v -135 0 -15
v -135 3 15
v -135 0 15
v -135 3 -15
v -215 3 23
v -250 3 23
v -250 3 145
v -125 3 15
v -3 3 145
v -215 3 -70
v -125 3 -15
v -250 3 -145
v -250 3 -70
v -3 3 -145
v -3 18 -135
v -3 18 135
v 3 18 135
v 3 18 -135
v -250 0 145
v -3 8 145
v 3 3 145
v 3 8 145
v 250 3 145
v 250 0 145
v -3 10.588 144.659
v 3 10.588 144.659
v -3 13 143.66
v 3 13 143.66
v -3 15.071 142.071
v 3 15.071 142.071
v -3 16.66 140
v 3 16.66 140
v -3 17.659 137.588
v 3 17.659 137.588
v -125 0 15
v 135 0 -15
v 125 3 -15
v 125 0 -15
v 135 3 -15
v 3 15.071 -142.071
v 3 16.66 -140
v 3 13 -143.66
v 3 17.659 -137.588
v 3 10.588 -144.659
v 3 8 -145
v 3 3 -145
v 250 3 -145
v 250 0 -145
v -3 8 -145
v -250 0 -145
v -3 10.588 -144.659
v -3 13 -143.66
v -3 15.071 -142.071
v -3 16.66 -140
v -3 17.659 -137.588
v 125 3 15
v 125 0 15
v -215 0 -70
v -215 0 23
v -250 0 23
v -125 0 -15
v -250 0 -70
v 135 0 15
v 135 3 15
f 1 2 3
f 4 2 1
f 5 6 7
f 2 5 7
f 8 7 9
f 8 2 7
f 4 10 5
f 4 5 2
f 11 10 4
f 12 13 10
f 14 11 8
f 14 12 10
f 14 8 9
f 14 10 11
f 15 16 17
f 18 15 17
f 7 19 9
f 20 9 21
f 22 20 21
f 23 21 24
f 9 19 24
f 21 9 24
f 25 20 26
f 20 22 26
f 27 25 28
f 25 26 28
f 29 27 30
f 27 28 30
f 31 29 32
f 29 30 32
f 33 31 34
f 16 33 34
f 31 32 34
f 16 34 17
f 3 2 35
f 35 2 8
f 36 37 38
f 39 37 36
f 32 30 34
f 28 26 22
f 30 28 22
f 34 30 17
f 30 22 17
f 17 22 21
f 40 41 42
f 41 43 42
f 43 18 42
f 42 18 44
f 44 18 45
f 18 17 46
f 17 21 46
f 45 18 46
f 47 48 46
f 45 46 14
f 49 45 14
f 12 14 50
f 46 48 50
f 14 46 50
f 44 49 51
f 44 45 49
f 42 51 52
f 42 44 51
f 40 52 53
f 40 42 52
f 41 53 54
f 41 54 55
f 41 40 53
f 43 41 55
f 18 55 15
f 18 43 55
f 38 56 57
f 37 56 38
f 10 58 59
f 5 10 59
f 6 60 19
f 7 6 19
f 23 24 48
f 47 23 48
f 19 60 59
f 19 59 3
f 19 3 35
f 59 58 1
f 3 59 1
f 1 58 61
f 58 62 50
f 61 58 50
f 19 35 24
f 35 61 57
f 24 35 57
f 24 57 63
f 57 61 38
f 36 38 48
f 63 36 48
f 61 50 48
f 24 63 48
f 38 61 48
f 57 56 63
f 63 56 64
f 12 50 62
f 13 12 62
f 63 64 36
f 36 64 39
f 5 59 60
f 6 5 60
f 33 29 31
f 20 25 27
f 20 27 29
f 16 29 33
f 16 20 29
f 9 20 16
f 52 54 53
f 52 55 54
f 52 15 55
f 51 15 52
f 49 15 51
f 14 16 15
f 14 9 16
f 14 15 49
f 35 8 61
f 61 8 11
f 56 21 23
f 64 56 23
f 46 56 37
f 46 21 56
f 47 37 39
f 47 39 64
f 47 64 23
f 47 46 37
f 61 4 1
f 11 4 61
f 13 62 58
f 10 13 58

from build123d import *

# Parameters (mm, degrees)
BOSS_EXTRUDE1_DEPTH = 3
SKETCH2_W           = 10
SKETCH2_H           = 30
CUT_EXTRUDE1_DEPTH  = 3
SKETCH3_W           = 6
SKETCH3_H           = 290
BOSS_EXTRUDE2_DEPTH = 15
FILLET1_R           = 10


with BuildPart() as part:
    # Sketch1 → Boss-Extrude1 (new body)
    with BuildSketch(Plane(origin=(0, 0, 0), x_dir=(1, 0, 0), z_dir=(0, 1, 0))):
        Polygon((-250, -145), (250, -145), (250, 145), (-250, 145), (-250, 70), (-215, 70), (-215, -23), (-250, -23), align=None)
    extrude(amount=BOSS_EXTRUDE1_DEPTH)

    # Sketch2 → Cut-Extrude1 (cut)
    with BuildSketch(Plane(origin=(0, 3, 0), x_dir=(1, 0, 0), z_dir=(0, 1, 0))):
        with Locations((130, 0)):
            Rectangle(SKETCH2_W, SKETCH2_H)
        with Locations((-130, 0)):
            Rectangle(SKETCH2_W, SKETCH2_H)
    extrude(amount=-CUT_EXTRUDE1_DEPTH, mode=Mode.SUBTRACT)

    # Sketch3 → Boss-Extrude2 (add)
    with BuildSketch(Plane(origin=(0, 3, 0), x_dir=(1, 0, 0), z_dir=(0, 1, 0))):
        Rectangle(SKETCH3_W, SKETCH3_H)
    extrude(amount=BOSS_EXTRUDE2_DEPTH)

    # Fillet1
    fillet1_edges = [part.edges().sort_by_distance(p)[0] for p in [
        (0, 18, -145),
        (0, 18, 145),
    ]]
    fillet(fillet1_edges, radius=FILLET1_R)


solid = part.part
